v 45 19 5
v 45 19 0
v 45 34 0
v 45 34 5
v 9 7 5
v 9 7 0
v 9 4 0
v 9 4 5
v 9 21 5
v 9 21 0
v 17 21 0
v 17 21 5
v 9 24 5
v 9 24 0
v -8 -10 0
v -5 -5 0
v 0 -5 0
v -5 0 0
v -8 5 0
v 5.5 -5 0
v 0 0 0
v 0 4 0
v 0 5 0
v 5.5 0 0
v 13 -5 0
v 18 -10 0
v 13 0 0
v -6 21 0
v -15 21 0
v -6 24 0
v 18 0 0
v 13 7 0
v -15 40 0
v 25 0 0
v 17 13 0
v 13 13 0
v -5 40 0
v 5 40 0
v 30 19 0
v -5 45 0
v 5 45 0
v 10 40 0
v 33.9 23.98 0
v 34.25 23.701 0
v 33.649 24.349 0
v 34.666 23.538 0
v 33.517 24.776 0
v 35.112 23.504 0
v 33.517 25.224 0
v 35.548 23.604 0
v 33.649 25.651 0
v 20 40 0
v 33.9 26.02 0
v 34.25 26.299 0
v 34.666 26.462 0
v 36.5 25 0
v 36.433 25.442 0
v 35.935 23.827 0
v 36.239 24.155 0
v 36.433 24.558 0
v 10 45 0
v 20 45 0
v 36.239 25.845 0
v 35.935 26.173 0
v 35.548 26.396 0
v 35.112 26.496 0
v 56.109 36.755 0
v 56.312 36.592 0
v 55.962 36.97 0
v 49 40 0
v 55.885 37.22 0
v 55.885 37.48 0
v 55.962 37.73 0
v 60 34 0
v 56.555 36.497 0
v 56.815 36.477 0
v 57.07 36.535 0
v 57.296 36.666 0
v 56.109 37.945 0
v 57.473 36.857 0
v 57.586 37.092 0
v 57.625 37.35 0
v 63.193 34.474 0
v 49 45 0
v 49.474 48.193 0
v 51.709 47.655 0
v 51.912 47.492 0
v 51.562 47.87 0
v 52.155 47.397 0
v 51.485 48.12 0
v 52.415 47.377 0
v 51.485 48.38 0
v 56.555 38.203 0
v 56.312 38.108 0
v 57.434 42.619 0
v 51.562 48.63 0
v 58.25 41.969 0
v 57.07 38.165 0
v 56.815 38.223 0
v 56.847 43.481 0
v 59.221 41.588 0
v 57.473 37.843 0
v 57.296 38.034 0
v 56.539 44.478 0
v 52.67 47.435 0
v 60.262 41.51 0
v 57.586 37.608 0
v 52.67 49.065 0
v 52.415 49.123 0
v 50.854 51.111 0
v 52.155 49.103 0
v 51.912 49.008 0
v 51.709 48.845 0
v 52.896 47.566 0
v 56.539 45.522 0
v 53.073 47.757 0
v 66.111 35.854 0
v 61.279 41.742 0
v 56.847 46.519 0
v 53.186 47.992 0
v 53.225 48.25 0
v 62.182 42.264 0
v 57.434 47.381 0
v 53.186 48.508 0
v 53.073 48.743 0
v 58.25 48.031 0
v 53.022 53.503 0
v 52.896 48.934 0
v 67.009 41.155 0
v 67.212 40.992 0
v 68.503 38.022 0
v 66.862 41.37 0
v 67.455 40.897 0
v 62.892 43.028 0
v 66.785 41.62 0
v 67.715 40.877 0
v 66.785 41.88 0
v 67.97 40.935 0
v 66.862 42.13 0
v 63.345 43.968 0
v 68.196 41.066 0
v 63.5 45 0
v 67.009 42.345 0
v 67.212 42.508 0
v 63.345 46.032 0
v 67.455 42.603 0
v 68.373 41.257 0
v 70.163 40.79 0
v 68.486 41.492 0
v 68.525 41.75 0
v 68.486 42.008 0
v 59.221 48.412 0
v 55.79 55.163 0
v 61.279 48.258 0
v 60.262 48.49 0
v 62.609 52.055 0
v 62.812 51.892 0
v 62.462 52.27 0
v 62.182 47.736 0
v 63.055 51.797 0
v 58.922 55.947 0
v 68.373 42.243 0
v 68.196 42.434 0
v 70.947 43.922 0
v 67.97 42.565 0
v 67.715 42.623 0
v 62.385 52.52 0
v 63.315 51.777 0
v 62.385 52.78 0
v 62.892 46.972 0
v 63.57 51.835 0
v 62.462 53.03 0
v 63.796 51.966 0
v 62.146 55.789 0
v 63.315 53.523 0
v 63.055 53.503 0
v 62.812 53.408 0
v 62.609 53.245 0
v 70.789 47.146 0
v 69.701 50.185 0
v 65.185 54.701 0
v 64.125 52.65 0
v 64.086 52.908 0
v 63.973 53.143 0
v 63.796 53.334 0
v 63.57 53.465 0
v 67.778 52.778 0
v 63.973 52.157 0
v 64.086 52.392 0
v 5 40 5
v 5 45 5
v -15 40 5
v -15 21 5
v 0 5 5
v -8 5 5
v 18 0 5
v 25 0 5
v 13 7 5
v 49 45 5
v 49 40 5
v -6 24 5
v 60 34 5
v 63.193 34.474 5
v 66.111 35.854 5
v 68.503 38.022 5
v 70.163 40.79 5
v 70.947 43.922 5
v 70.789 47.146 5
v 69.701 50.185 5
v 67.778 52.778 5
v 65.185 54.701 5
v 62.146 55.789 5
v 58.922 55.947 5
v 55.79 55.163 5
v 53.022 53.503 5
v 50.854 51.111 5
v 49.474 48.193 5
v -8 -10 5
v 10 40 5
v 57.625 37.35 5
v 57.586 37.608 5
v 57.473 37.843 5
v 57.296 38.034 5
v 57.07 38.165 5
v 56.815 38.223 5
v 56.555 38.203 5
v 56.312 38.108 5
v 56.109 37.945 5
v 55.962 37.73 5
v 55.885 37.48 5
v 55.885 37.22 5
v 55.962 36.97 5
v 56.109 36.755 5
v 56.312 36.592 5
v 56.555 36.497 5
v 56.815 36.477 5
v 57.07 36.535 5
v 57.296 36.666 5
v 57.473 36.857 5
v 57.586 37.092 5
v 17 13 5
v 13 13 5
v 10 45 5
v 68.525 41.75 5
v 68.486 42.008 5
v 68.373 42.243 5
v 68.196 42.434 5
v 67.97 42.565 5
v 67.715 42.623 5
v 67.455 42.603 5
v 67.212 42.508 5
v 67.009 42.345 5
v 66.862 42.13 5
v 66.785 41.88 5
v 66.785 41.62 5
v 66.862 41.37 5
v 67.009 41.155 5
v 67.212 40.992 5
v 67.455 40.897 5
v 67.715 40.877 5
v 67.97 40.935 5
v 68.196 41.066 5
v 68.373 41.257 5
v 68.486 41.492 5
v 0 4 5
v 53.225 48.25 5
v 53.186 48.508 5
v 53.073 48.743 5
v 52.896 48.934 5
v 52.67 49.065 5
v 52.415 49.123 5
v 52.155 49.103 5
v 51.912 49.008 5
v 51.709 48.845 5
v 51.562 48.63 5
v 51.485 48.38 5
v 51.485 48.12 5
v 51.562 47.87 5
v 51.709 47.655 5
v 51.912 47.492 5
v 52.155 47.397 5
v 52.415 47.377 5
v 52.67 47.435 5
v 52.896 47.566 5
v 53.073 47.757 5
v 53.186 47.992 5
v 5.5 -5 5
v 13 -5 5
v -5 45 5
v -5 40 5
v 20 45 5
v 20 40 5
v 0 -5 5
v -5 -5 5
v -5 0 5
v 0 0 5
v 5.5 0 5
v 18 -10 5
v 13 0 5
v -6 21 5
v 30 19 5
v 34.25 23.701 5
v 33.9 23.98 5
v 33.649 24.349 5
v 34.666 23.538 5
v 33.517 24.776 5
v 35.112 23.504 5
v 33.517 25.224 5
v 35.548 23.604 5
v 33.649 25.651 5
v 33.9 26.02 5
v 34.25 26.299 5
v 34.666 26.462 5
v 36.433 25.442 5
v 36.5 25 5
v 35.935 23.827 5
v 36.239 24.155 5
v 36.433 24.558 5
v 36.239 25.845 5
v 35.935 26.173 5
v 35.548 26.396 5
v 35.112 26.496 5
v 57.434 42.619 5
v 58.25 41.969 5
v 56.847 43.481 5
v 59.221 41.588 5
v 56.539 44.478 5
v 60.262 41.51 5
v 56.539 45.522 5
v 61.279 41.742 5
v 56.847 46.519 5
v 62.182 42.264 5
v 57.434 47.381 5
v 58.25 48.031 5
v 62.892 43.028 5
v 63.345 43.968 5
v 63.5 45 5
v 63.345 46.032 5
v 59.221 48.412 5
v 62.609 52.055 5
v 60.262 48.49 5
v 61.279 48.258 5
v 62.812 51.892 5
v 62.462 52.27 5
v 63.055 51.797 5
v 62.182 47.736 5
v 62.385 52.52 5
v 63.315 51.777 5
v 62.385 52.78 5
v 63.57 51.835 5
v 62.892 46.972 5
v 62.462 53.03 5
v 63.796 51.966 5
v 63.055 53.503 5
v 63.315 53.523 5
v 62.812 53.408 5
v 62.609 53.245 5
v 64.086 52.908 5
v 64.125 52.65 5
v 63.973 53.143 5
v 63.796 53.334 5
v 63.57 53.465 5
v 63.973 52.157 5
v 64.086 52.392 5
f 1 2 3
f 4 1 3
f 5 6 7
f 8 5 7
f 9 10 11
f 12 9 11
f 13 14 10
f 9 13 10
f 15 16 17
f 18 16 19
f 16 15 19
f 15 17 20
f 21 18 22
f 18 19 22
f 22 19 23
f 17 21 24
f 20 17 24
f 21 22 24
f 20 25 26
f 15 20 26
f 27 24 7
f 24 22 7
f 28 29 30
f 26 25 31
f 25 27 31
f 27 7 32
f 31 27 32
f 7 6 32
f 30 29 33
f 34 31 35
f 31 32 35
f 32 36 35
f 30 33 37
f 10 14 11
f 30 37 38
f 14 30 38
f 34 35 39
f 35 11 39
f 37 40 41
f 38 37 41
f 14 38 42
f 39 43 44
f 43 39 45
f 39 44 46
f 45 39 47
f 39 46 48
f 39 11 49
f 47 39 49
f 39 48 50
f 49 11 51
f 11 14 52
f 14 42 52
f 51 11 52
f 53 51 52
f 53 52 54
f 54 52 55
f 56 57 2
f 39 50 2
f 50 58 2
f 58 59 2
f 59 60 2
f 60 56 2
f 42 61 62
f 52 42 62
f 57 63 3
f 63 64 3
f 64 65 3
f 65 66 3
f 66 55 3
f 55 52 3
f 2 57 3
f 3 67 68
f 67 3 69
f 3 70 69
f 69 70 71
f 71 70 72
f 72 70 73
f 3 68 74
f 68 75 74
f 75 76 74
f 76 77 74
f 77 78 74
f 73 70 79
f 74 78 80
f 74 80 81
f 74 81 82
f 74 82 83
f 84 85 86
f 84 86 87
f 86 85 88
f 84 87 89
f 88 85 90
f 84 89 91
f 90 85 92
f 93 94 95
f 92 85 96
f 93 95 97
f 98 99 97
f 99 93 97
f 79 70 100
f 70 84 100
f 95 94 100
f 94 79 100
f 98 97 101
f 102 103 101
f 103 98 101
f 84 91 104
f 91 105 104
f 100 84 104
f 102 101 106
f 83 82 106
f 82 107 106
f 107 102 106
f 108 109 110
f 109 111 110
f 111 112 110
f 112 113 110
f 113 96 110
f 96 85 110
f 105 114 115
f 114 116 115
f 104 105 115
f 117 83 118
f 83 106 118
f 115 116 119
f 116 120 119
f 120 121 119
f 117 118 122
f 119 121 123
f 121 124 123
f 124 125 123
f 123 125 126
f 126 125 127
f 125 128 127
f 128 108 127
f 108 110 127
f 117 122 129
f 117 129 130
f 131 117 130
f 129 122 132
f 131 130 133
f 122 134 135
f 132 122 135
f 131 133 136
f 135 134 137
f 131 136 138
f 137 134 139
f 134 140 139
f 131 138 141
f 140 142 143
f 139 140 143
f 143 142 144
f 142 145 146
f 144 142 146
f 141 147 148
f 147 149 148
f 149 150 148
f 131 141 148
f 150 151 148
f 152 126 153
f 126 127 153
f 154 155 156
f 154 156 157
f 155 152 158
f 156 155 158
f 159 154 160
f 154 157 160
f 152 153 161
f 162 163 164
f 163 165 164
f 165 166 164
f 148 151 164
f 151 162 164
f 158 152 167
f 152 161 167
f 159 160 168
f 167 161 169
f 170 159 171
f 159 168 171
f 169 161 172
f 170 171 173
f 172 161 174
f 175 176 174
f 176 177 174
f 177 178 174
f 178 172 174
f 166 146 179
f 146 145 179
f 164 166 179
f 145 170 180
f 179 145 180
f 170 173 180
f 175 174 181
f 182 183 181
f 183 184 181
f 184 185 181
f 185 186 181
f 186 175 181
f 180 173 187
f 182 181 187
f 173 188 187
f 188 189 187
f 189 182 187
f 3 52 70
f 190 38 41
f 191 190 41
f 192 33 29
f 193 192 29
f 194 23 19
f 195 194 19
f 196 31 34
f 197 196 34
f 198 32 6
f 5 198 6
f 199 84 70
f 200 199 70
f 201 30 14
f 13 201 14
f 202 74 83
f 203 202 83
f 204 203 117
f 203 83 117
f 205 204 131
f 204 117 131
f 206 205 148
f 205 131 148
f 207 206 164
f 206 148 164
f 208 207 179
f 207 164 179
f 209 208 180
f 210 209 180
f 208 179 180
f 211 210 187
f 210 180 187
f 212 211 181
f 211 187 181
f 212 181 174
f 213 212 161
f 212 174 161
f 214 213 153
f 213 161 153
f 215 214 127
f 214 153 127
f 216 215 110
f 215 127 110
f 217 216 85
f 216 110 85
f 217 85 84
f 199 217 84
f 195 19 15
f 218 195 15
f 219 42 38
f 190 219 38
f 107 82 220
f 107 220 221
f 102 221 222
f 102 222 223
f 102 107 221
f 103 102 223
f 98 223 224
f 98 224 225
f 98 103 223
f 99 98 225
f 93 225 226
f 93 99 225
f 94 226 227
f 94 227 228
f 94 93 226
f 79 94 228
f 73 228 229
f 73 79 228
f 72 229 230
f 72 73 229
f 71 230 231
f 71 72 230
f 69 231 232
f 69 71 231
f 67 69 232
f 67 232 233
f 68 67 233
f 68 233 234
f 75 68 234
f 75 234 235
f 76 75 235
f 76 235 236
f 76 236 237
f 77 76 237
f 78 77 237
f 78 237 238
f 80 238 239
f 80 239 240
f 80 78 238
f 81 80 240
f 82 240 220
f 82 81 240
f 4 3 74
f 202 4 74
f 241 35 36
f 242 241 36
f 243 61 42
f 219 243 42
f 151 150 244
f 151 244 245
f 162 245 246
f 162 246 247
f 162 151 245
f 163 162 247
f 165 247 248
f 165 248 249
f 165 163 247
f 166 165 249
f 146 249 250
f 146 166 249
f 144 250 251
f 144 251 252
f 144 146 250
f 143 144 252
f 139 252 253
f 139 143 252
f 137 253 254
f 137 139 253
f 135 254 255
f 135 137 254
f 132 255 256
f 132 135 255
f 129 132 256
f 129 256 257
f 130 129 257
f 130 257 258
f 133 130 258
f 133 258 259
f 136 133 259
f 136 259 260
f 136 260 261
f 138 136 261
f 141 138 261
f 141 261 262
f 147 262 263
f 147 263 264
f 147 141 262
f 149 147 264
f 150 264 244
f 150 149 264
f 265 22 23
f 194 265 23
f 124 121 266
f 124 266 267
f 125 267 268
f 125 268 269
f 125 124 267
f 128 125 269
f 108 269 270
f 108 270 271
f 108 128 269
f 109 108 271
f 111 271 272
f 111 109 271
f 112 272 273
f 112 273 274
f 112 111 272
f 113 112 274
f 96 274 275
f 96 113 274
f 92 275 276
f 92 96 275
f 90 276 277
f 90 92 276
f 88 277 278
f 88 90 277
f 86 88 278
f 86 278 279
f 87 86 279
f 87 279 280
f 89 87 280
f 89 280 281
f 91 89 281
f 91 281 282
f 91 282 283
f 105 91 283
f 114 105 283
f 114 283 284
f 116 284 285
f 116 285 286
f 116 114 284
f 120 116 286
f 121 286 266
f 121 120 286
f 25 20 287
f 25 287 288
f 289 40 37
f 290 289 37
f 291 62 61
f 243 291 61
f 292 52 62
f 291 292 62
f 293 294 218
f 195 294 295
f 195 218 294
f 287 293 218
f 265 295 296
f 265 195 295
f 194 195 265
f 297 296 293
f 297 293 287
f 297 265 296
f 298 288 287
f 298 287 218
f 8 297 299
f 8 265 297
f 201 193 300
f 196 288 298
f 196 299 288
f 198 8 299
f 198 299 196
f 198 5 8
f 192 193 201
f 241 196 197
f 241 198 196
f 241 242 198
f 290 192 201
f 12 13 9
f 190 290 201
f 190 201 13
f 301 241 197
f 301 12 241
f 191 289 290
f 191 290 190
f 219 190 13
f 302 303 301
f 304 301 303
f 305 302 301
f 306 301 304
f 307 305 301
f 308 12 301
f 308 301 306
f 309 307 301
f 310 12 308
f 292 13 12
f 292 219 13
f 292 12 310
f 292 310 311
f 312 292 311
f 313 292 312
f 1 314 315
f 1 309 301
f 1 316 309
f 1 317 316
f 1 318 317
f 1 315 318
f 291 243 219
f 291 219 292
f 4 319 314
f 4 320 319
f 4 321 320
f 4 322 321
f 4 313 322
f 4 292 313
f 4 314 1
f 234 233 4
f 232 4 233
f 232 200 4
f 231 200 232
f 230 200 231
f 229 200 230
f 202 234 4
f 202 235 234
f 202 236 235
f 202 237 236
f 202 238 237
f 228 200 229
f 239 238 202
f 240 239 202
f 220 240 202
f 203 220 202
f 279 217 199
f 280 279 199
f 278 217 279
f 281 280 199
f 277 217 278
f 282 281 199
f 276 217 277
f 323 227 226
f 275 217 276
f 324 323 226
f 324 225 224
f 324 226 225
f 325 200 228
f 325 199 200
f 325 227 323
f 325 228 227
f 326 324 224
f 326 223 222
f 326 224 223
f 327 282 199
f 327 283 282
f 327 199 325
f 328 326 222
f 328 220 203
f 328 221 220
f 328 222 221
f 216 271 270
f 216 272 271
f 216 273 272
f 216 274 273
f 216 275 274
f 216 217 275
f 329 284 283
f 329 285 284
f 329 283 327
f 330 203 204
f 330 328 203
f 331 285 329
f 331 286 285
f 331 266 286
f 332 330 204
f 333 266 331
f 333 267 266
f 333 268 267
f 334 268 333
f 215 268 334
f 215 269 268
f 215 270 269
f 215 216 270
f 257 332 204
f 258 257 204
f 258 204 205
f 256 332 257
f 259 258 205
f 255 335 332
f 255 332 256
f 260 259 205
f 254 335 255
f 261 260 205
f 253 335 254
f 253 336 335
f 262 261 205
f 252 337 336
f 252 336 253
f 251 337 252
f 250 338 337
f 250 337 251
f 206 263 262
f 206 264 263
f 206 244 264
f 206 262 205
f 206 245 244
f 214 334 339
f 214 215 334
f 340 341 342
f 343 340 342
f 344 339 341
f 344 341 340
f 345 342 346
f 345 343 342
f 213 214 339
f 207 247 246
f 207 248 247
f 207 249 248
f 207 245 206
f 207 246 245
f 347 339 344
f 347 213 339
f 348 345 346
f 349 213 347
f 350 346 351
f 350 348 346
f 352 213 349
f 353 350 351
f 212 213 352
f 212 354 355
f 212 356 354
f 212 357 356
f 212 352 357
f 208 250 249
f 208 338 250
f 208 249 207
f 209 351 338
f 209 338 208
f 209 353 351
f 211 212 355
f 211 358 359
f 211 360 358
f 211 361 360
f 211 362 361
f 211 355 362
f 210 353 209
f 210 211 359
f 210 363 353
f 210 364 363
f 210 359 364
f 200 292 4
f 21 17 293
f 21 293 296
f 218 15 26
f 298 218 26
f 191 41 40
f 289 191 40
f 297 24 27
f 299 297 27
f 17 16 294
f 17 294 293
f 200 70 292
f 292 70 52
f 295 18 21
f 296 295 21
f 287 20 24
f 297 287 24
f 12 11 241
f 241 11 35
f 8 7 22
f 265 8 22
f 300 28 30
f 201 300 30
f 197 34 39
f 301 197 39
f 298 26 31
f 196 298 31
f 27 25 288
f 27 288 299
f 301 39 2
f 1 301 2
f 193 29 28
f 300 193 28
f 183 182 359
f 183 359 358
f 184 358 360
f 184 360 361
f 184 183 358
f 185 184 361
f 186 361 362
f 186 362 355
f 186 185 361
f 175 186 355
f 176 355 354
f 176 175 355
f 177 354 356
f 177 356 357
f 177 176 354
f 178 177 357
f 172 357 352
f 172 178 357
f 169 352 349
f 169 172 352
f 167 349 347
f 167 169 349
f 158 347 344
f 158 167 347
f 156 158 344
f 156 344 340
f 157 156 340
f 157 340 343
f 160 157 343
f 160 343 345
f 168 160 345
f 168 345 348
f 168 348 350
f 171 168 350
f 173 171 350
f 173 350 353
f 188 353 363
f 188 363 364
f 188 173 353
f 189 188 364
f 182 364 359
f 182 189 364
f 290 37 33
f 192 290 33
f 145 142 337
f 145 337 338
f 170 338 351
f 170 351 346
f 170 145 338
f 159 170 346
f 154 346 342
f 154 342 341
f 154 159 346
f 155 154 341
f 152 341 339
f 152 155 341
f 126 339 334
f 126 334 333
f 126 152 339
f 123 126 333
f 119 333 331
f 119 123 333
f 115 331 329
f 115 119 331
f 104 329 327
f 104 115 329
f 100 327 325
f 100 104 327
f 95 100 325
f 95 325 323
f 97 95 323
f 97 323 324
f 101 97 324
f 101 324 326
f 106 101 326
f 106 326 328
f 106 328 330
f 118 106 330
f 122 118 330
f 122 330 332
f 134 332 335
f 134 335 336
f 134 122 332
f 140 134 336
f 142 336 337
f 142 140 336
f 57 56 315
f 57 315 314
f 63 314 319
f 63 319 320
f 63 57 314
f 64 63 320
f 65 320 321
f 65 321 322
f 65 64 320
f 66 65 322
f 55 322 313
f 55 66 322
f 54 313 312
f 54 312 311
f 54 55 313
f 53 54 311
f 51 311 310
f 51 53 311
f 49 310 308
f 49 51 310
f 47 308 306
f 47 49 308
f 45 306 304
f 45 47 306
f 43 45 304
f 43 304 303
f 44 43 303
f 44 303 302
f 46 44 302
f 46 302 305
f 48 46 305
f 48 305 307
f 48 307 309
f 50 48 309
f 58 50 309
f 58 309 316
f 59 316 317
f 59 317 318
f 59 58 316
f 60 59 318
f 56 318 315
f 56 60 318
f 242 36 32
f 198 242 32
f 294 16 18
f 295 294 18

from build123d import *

# Parameters (mm, degrees)
ESQUISSE1_W        = 5
ESQUISSE1_H        = 5
ESQUISSE1_W_2      = 7.5
ESQUISSE1_R        = 1.5
ESQUISSE1_R_2      = 0.875
ESQUISSE1_R_3      = 3.5
BOSS_EXTRU_1_DEPTH = 5


with BuildPart() as part:
    # Esquisse1 → Boss.-Extru.1 (new body)
    with BuildSketch(Plane.XY):
        with BuildLine():
            Line((-8, 5), (-8, -10))
            Line((-8, -10), (18, -10))
            Line((18, -10), (18, 0))
            Line((18, 0), (25, 0))
            Line((25, 0), (30, 19))
            Line((30, 19), (45, 19))
            Line((45, 19), (45, 34))
            Line((45, 34), (60, 34))
            ThreePointArc((60, 34), (67.778174593, 52.778174593), (49, 45))
            Line((49, 45), (49, 40))
            Line((49, 40), (20, 40))
            Line((20, 40), (20, 45))
            Line((20, 45), (10, 45))
            Line((10, 45), (10, 40))
            Line((10, 40), (5, 40))
            Line((5, 40), (5, 45))
            Line((5, 45), (-5, 45))
            Line((-5, 45), (-5, 40))
            Line((-5, 40), (-15, 40))
            Line((-15, 40), (-15, 21))
            Line((-15, 21), (-6, 21))
            Line((-6, 21), (-6, 24))
            Line((-6, 24), (9, 24))
            Line((9, 24), (9, 21))
            Line((9, 21), (17, 21))
            Line((17, 21), (17, 13))
            Line((17, 13), (13, 13))
            Line((13, 13), (13, 7))
            Line((13, 7), (9, 7))
            Line((9, 7), (9, 4))
            Line((9, 4), (0, 4))
            Line((0, 4), (0, 5))
            Line((0, 5), (-8, 5))
        make_face()
        with Locations((-2.5, -2.5)):
            Rectangle(ESQUISSE1_W, ESQUISSE1_H, mode=Mode.SUBTRACT)
        with Locations((9.25, -2.5)):
            Rectangle(ESQUISSE1_W_2, ESQUISSE1_H, mode=Mode.SUBTRACT)
        with Locations((35, 25)):
            Circle(ESQUISSE1_R, mode=Mode.SUBTRACT)
        with Locations((56.75, 37.35)):
            Circle(ESQUISSE1_R_2, mode=Mode.SUBTRACT)
        with Locations((60, 45)):
            Circle(ESQUISSE1_R_3, mode=Mode.SUBTRACT)
        with Locations((67.65, 41.75)):
            Circle(ESQUISSE1_R_2, mode=Mode.SUBTRACT)
        with Locations((52.35, 48.25)):
            Circle(ESQUISSE1_R_2, mode=Mode.SUBTRACT)
        with Locations((63.25, 52.65)):
            Circle(ESQUISSE1_R_2, mode=Mode.SUBTRACT)
    extrude(amount=BOSS_EXTRU_1_DEPTH)


solid = part.part
